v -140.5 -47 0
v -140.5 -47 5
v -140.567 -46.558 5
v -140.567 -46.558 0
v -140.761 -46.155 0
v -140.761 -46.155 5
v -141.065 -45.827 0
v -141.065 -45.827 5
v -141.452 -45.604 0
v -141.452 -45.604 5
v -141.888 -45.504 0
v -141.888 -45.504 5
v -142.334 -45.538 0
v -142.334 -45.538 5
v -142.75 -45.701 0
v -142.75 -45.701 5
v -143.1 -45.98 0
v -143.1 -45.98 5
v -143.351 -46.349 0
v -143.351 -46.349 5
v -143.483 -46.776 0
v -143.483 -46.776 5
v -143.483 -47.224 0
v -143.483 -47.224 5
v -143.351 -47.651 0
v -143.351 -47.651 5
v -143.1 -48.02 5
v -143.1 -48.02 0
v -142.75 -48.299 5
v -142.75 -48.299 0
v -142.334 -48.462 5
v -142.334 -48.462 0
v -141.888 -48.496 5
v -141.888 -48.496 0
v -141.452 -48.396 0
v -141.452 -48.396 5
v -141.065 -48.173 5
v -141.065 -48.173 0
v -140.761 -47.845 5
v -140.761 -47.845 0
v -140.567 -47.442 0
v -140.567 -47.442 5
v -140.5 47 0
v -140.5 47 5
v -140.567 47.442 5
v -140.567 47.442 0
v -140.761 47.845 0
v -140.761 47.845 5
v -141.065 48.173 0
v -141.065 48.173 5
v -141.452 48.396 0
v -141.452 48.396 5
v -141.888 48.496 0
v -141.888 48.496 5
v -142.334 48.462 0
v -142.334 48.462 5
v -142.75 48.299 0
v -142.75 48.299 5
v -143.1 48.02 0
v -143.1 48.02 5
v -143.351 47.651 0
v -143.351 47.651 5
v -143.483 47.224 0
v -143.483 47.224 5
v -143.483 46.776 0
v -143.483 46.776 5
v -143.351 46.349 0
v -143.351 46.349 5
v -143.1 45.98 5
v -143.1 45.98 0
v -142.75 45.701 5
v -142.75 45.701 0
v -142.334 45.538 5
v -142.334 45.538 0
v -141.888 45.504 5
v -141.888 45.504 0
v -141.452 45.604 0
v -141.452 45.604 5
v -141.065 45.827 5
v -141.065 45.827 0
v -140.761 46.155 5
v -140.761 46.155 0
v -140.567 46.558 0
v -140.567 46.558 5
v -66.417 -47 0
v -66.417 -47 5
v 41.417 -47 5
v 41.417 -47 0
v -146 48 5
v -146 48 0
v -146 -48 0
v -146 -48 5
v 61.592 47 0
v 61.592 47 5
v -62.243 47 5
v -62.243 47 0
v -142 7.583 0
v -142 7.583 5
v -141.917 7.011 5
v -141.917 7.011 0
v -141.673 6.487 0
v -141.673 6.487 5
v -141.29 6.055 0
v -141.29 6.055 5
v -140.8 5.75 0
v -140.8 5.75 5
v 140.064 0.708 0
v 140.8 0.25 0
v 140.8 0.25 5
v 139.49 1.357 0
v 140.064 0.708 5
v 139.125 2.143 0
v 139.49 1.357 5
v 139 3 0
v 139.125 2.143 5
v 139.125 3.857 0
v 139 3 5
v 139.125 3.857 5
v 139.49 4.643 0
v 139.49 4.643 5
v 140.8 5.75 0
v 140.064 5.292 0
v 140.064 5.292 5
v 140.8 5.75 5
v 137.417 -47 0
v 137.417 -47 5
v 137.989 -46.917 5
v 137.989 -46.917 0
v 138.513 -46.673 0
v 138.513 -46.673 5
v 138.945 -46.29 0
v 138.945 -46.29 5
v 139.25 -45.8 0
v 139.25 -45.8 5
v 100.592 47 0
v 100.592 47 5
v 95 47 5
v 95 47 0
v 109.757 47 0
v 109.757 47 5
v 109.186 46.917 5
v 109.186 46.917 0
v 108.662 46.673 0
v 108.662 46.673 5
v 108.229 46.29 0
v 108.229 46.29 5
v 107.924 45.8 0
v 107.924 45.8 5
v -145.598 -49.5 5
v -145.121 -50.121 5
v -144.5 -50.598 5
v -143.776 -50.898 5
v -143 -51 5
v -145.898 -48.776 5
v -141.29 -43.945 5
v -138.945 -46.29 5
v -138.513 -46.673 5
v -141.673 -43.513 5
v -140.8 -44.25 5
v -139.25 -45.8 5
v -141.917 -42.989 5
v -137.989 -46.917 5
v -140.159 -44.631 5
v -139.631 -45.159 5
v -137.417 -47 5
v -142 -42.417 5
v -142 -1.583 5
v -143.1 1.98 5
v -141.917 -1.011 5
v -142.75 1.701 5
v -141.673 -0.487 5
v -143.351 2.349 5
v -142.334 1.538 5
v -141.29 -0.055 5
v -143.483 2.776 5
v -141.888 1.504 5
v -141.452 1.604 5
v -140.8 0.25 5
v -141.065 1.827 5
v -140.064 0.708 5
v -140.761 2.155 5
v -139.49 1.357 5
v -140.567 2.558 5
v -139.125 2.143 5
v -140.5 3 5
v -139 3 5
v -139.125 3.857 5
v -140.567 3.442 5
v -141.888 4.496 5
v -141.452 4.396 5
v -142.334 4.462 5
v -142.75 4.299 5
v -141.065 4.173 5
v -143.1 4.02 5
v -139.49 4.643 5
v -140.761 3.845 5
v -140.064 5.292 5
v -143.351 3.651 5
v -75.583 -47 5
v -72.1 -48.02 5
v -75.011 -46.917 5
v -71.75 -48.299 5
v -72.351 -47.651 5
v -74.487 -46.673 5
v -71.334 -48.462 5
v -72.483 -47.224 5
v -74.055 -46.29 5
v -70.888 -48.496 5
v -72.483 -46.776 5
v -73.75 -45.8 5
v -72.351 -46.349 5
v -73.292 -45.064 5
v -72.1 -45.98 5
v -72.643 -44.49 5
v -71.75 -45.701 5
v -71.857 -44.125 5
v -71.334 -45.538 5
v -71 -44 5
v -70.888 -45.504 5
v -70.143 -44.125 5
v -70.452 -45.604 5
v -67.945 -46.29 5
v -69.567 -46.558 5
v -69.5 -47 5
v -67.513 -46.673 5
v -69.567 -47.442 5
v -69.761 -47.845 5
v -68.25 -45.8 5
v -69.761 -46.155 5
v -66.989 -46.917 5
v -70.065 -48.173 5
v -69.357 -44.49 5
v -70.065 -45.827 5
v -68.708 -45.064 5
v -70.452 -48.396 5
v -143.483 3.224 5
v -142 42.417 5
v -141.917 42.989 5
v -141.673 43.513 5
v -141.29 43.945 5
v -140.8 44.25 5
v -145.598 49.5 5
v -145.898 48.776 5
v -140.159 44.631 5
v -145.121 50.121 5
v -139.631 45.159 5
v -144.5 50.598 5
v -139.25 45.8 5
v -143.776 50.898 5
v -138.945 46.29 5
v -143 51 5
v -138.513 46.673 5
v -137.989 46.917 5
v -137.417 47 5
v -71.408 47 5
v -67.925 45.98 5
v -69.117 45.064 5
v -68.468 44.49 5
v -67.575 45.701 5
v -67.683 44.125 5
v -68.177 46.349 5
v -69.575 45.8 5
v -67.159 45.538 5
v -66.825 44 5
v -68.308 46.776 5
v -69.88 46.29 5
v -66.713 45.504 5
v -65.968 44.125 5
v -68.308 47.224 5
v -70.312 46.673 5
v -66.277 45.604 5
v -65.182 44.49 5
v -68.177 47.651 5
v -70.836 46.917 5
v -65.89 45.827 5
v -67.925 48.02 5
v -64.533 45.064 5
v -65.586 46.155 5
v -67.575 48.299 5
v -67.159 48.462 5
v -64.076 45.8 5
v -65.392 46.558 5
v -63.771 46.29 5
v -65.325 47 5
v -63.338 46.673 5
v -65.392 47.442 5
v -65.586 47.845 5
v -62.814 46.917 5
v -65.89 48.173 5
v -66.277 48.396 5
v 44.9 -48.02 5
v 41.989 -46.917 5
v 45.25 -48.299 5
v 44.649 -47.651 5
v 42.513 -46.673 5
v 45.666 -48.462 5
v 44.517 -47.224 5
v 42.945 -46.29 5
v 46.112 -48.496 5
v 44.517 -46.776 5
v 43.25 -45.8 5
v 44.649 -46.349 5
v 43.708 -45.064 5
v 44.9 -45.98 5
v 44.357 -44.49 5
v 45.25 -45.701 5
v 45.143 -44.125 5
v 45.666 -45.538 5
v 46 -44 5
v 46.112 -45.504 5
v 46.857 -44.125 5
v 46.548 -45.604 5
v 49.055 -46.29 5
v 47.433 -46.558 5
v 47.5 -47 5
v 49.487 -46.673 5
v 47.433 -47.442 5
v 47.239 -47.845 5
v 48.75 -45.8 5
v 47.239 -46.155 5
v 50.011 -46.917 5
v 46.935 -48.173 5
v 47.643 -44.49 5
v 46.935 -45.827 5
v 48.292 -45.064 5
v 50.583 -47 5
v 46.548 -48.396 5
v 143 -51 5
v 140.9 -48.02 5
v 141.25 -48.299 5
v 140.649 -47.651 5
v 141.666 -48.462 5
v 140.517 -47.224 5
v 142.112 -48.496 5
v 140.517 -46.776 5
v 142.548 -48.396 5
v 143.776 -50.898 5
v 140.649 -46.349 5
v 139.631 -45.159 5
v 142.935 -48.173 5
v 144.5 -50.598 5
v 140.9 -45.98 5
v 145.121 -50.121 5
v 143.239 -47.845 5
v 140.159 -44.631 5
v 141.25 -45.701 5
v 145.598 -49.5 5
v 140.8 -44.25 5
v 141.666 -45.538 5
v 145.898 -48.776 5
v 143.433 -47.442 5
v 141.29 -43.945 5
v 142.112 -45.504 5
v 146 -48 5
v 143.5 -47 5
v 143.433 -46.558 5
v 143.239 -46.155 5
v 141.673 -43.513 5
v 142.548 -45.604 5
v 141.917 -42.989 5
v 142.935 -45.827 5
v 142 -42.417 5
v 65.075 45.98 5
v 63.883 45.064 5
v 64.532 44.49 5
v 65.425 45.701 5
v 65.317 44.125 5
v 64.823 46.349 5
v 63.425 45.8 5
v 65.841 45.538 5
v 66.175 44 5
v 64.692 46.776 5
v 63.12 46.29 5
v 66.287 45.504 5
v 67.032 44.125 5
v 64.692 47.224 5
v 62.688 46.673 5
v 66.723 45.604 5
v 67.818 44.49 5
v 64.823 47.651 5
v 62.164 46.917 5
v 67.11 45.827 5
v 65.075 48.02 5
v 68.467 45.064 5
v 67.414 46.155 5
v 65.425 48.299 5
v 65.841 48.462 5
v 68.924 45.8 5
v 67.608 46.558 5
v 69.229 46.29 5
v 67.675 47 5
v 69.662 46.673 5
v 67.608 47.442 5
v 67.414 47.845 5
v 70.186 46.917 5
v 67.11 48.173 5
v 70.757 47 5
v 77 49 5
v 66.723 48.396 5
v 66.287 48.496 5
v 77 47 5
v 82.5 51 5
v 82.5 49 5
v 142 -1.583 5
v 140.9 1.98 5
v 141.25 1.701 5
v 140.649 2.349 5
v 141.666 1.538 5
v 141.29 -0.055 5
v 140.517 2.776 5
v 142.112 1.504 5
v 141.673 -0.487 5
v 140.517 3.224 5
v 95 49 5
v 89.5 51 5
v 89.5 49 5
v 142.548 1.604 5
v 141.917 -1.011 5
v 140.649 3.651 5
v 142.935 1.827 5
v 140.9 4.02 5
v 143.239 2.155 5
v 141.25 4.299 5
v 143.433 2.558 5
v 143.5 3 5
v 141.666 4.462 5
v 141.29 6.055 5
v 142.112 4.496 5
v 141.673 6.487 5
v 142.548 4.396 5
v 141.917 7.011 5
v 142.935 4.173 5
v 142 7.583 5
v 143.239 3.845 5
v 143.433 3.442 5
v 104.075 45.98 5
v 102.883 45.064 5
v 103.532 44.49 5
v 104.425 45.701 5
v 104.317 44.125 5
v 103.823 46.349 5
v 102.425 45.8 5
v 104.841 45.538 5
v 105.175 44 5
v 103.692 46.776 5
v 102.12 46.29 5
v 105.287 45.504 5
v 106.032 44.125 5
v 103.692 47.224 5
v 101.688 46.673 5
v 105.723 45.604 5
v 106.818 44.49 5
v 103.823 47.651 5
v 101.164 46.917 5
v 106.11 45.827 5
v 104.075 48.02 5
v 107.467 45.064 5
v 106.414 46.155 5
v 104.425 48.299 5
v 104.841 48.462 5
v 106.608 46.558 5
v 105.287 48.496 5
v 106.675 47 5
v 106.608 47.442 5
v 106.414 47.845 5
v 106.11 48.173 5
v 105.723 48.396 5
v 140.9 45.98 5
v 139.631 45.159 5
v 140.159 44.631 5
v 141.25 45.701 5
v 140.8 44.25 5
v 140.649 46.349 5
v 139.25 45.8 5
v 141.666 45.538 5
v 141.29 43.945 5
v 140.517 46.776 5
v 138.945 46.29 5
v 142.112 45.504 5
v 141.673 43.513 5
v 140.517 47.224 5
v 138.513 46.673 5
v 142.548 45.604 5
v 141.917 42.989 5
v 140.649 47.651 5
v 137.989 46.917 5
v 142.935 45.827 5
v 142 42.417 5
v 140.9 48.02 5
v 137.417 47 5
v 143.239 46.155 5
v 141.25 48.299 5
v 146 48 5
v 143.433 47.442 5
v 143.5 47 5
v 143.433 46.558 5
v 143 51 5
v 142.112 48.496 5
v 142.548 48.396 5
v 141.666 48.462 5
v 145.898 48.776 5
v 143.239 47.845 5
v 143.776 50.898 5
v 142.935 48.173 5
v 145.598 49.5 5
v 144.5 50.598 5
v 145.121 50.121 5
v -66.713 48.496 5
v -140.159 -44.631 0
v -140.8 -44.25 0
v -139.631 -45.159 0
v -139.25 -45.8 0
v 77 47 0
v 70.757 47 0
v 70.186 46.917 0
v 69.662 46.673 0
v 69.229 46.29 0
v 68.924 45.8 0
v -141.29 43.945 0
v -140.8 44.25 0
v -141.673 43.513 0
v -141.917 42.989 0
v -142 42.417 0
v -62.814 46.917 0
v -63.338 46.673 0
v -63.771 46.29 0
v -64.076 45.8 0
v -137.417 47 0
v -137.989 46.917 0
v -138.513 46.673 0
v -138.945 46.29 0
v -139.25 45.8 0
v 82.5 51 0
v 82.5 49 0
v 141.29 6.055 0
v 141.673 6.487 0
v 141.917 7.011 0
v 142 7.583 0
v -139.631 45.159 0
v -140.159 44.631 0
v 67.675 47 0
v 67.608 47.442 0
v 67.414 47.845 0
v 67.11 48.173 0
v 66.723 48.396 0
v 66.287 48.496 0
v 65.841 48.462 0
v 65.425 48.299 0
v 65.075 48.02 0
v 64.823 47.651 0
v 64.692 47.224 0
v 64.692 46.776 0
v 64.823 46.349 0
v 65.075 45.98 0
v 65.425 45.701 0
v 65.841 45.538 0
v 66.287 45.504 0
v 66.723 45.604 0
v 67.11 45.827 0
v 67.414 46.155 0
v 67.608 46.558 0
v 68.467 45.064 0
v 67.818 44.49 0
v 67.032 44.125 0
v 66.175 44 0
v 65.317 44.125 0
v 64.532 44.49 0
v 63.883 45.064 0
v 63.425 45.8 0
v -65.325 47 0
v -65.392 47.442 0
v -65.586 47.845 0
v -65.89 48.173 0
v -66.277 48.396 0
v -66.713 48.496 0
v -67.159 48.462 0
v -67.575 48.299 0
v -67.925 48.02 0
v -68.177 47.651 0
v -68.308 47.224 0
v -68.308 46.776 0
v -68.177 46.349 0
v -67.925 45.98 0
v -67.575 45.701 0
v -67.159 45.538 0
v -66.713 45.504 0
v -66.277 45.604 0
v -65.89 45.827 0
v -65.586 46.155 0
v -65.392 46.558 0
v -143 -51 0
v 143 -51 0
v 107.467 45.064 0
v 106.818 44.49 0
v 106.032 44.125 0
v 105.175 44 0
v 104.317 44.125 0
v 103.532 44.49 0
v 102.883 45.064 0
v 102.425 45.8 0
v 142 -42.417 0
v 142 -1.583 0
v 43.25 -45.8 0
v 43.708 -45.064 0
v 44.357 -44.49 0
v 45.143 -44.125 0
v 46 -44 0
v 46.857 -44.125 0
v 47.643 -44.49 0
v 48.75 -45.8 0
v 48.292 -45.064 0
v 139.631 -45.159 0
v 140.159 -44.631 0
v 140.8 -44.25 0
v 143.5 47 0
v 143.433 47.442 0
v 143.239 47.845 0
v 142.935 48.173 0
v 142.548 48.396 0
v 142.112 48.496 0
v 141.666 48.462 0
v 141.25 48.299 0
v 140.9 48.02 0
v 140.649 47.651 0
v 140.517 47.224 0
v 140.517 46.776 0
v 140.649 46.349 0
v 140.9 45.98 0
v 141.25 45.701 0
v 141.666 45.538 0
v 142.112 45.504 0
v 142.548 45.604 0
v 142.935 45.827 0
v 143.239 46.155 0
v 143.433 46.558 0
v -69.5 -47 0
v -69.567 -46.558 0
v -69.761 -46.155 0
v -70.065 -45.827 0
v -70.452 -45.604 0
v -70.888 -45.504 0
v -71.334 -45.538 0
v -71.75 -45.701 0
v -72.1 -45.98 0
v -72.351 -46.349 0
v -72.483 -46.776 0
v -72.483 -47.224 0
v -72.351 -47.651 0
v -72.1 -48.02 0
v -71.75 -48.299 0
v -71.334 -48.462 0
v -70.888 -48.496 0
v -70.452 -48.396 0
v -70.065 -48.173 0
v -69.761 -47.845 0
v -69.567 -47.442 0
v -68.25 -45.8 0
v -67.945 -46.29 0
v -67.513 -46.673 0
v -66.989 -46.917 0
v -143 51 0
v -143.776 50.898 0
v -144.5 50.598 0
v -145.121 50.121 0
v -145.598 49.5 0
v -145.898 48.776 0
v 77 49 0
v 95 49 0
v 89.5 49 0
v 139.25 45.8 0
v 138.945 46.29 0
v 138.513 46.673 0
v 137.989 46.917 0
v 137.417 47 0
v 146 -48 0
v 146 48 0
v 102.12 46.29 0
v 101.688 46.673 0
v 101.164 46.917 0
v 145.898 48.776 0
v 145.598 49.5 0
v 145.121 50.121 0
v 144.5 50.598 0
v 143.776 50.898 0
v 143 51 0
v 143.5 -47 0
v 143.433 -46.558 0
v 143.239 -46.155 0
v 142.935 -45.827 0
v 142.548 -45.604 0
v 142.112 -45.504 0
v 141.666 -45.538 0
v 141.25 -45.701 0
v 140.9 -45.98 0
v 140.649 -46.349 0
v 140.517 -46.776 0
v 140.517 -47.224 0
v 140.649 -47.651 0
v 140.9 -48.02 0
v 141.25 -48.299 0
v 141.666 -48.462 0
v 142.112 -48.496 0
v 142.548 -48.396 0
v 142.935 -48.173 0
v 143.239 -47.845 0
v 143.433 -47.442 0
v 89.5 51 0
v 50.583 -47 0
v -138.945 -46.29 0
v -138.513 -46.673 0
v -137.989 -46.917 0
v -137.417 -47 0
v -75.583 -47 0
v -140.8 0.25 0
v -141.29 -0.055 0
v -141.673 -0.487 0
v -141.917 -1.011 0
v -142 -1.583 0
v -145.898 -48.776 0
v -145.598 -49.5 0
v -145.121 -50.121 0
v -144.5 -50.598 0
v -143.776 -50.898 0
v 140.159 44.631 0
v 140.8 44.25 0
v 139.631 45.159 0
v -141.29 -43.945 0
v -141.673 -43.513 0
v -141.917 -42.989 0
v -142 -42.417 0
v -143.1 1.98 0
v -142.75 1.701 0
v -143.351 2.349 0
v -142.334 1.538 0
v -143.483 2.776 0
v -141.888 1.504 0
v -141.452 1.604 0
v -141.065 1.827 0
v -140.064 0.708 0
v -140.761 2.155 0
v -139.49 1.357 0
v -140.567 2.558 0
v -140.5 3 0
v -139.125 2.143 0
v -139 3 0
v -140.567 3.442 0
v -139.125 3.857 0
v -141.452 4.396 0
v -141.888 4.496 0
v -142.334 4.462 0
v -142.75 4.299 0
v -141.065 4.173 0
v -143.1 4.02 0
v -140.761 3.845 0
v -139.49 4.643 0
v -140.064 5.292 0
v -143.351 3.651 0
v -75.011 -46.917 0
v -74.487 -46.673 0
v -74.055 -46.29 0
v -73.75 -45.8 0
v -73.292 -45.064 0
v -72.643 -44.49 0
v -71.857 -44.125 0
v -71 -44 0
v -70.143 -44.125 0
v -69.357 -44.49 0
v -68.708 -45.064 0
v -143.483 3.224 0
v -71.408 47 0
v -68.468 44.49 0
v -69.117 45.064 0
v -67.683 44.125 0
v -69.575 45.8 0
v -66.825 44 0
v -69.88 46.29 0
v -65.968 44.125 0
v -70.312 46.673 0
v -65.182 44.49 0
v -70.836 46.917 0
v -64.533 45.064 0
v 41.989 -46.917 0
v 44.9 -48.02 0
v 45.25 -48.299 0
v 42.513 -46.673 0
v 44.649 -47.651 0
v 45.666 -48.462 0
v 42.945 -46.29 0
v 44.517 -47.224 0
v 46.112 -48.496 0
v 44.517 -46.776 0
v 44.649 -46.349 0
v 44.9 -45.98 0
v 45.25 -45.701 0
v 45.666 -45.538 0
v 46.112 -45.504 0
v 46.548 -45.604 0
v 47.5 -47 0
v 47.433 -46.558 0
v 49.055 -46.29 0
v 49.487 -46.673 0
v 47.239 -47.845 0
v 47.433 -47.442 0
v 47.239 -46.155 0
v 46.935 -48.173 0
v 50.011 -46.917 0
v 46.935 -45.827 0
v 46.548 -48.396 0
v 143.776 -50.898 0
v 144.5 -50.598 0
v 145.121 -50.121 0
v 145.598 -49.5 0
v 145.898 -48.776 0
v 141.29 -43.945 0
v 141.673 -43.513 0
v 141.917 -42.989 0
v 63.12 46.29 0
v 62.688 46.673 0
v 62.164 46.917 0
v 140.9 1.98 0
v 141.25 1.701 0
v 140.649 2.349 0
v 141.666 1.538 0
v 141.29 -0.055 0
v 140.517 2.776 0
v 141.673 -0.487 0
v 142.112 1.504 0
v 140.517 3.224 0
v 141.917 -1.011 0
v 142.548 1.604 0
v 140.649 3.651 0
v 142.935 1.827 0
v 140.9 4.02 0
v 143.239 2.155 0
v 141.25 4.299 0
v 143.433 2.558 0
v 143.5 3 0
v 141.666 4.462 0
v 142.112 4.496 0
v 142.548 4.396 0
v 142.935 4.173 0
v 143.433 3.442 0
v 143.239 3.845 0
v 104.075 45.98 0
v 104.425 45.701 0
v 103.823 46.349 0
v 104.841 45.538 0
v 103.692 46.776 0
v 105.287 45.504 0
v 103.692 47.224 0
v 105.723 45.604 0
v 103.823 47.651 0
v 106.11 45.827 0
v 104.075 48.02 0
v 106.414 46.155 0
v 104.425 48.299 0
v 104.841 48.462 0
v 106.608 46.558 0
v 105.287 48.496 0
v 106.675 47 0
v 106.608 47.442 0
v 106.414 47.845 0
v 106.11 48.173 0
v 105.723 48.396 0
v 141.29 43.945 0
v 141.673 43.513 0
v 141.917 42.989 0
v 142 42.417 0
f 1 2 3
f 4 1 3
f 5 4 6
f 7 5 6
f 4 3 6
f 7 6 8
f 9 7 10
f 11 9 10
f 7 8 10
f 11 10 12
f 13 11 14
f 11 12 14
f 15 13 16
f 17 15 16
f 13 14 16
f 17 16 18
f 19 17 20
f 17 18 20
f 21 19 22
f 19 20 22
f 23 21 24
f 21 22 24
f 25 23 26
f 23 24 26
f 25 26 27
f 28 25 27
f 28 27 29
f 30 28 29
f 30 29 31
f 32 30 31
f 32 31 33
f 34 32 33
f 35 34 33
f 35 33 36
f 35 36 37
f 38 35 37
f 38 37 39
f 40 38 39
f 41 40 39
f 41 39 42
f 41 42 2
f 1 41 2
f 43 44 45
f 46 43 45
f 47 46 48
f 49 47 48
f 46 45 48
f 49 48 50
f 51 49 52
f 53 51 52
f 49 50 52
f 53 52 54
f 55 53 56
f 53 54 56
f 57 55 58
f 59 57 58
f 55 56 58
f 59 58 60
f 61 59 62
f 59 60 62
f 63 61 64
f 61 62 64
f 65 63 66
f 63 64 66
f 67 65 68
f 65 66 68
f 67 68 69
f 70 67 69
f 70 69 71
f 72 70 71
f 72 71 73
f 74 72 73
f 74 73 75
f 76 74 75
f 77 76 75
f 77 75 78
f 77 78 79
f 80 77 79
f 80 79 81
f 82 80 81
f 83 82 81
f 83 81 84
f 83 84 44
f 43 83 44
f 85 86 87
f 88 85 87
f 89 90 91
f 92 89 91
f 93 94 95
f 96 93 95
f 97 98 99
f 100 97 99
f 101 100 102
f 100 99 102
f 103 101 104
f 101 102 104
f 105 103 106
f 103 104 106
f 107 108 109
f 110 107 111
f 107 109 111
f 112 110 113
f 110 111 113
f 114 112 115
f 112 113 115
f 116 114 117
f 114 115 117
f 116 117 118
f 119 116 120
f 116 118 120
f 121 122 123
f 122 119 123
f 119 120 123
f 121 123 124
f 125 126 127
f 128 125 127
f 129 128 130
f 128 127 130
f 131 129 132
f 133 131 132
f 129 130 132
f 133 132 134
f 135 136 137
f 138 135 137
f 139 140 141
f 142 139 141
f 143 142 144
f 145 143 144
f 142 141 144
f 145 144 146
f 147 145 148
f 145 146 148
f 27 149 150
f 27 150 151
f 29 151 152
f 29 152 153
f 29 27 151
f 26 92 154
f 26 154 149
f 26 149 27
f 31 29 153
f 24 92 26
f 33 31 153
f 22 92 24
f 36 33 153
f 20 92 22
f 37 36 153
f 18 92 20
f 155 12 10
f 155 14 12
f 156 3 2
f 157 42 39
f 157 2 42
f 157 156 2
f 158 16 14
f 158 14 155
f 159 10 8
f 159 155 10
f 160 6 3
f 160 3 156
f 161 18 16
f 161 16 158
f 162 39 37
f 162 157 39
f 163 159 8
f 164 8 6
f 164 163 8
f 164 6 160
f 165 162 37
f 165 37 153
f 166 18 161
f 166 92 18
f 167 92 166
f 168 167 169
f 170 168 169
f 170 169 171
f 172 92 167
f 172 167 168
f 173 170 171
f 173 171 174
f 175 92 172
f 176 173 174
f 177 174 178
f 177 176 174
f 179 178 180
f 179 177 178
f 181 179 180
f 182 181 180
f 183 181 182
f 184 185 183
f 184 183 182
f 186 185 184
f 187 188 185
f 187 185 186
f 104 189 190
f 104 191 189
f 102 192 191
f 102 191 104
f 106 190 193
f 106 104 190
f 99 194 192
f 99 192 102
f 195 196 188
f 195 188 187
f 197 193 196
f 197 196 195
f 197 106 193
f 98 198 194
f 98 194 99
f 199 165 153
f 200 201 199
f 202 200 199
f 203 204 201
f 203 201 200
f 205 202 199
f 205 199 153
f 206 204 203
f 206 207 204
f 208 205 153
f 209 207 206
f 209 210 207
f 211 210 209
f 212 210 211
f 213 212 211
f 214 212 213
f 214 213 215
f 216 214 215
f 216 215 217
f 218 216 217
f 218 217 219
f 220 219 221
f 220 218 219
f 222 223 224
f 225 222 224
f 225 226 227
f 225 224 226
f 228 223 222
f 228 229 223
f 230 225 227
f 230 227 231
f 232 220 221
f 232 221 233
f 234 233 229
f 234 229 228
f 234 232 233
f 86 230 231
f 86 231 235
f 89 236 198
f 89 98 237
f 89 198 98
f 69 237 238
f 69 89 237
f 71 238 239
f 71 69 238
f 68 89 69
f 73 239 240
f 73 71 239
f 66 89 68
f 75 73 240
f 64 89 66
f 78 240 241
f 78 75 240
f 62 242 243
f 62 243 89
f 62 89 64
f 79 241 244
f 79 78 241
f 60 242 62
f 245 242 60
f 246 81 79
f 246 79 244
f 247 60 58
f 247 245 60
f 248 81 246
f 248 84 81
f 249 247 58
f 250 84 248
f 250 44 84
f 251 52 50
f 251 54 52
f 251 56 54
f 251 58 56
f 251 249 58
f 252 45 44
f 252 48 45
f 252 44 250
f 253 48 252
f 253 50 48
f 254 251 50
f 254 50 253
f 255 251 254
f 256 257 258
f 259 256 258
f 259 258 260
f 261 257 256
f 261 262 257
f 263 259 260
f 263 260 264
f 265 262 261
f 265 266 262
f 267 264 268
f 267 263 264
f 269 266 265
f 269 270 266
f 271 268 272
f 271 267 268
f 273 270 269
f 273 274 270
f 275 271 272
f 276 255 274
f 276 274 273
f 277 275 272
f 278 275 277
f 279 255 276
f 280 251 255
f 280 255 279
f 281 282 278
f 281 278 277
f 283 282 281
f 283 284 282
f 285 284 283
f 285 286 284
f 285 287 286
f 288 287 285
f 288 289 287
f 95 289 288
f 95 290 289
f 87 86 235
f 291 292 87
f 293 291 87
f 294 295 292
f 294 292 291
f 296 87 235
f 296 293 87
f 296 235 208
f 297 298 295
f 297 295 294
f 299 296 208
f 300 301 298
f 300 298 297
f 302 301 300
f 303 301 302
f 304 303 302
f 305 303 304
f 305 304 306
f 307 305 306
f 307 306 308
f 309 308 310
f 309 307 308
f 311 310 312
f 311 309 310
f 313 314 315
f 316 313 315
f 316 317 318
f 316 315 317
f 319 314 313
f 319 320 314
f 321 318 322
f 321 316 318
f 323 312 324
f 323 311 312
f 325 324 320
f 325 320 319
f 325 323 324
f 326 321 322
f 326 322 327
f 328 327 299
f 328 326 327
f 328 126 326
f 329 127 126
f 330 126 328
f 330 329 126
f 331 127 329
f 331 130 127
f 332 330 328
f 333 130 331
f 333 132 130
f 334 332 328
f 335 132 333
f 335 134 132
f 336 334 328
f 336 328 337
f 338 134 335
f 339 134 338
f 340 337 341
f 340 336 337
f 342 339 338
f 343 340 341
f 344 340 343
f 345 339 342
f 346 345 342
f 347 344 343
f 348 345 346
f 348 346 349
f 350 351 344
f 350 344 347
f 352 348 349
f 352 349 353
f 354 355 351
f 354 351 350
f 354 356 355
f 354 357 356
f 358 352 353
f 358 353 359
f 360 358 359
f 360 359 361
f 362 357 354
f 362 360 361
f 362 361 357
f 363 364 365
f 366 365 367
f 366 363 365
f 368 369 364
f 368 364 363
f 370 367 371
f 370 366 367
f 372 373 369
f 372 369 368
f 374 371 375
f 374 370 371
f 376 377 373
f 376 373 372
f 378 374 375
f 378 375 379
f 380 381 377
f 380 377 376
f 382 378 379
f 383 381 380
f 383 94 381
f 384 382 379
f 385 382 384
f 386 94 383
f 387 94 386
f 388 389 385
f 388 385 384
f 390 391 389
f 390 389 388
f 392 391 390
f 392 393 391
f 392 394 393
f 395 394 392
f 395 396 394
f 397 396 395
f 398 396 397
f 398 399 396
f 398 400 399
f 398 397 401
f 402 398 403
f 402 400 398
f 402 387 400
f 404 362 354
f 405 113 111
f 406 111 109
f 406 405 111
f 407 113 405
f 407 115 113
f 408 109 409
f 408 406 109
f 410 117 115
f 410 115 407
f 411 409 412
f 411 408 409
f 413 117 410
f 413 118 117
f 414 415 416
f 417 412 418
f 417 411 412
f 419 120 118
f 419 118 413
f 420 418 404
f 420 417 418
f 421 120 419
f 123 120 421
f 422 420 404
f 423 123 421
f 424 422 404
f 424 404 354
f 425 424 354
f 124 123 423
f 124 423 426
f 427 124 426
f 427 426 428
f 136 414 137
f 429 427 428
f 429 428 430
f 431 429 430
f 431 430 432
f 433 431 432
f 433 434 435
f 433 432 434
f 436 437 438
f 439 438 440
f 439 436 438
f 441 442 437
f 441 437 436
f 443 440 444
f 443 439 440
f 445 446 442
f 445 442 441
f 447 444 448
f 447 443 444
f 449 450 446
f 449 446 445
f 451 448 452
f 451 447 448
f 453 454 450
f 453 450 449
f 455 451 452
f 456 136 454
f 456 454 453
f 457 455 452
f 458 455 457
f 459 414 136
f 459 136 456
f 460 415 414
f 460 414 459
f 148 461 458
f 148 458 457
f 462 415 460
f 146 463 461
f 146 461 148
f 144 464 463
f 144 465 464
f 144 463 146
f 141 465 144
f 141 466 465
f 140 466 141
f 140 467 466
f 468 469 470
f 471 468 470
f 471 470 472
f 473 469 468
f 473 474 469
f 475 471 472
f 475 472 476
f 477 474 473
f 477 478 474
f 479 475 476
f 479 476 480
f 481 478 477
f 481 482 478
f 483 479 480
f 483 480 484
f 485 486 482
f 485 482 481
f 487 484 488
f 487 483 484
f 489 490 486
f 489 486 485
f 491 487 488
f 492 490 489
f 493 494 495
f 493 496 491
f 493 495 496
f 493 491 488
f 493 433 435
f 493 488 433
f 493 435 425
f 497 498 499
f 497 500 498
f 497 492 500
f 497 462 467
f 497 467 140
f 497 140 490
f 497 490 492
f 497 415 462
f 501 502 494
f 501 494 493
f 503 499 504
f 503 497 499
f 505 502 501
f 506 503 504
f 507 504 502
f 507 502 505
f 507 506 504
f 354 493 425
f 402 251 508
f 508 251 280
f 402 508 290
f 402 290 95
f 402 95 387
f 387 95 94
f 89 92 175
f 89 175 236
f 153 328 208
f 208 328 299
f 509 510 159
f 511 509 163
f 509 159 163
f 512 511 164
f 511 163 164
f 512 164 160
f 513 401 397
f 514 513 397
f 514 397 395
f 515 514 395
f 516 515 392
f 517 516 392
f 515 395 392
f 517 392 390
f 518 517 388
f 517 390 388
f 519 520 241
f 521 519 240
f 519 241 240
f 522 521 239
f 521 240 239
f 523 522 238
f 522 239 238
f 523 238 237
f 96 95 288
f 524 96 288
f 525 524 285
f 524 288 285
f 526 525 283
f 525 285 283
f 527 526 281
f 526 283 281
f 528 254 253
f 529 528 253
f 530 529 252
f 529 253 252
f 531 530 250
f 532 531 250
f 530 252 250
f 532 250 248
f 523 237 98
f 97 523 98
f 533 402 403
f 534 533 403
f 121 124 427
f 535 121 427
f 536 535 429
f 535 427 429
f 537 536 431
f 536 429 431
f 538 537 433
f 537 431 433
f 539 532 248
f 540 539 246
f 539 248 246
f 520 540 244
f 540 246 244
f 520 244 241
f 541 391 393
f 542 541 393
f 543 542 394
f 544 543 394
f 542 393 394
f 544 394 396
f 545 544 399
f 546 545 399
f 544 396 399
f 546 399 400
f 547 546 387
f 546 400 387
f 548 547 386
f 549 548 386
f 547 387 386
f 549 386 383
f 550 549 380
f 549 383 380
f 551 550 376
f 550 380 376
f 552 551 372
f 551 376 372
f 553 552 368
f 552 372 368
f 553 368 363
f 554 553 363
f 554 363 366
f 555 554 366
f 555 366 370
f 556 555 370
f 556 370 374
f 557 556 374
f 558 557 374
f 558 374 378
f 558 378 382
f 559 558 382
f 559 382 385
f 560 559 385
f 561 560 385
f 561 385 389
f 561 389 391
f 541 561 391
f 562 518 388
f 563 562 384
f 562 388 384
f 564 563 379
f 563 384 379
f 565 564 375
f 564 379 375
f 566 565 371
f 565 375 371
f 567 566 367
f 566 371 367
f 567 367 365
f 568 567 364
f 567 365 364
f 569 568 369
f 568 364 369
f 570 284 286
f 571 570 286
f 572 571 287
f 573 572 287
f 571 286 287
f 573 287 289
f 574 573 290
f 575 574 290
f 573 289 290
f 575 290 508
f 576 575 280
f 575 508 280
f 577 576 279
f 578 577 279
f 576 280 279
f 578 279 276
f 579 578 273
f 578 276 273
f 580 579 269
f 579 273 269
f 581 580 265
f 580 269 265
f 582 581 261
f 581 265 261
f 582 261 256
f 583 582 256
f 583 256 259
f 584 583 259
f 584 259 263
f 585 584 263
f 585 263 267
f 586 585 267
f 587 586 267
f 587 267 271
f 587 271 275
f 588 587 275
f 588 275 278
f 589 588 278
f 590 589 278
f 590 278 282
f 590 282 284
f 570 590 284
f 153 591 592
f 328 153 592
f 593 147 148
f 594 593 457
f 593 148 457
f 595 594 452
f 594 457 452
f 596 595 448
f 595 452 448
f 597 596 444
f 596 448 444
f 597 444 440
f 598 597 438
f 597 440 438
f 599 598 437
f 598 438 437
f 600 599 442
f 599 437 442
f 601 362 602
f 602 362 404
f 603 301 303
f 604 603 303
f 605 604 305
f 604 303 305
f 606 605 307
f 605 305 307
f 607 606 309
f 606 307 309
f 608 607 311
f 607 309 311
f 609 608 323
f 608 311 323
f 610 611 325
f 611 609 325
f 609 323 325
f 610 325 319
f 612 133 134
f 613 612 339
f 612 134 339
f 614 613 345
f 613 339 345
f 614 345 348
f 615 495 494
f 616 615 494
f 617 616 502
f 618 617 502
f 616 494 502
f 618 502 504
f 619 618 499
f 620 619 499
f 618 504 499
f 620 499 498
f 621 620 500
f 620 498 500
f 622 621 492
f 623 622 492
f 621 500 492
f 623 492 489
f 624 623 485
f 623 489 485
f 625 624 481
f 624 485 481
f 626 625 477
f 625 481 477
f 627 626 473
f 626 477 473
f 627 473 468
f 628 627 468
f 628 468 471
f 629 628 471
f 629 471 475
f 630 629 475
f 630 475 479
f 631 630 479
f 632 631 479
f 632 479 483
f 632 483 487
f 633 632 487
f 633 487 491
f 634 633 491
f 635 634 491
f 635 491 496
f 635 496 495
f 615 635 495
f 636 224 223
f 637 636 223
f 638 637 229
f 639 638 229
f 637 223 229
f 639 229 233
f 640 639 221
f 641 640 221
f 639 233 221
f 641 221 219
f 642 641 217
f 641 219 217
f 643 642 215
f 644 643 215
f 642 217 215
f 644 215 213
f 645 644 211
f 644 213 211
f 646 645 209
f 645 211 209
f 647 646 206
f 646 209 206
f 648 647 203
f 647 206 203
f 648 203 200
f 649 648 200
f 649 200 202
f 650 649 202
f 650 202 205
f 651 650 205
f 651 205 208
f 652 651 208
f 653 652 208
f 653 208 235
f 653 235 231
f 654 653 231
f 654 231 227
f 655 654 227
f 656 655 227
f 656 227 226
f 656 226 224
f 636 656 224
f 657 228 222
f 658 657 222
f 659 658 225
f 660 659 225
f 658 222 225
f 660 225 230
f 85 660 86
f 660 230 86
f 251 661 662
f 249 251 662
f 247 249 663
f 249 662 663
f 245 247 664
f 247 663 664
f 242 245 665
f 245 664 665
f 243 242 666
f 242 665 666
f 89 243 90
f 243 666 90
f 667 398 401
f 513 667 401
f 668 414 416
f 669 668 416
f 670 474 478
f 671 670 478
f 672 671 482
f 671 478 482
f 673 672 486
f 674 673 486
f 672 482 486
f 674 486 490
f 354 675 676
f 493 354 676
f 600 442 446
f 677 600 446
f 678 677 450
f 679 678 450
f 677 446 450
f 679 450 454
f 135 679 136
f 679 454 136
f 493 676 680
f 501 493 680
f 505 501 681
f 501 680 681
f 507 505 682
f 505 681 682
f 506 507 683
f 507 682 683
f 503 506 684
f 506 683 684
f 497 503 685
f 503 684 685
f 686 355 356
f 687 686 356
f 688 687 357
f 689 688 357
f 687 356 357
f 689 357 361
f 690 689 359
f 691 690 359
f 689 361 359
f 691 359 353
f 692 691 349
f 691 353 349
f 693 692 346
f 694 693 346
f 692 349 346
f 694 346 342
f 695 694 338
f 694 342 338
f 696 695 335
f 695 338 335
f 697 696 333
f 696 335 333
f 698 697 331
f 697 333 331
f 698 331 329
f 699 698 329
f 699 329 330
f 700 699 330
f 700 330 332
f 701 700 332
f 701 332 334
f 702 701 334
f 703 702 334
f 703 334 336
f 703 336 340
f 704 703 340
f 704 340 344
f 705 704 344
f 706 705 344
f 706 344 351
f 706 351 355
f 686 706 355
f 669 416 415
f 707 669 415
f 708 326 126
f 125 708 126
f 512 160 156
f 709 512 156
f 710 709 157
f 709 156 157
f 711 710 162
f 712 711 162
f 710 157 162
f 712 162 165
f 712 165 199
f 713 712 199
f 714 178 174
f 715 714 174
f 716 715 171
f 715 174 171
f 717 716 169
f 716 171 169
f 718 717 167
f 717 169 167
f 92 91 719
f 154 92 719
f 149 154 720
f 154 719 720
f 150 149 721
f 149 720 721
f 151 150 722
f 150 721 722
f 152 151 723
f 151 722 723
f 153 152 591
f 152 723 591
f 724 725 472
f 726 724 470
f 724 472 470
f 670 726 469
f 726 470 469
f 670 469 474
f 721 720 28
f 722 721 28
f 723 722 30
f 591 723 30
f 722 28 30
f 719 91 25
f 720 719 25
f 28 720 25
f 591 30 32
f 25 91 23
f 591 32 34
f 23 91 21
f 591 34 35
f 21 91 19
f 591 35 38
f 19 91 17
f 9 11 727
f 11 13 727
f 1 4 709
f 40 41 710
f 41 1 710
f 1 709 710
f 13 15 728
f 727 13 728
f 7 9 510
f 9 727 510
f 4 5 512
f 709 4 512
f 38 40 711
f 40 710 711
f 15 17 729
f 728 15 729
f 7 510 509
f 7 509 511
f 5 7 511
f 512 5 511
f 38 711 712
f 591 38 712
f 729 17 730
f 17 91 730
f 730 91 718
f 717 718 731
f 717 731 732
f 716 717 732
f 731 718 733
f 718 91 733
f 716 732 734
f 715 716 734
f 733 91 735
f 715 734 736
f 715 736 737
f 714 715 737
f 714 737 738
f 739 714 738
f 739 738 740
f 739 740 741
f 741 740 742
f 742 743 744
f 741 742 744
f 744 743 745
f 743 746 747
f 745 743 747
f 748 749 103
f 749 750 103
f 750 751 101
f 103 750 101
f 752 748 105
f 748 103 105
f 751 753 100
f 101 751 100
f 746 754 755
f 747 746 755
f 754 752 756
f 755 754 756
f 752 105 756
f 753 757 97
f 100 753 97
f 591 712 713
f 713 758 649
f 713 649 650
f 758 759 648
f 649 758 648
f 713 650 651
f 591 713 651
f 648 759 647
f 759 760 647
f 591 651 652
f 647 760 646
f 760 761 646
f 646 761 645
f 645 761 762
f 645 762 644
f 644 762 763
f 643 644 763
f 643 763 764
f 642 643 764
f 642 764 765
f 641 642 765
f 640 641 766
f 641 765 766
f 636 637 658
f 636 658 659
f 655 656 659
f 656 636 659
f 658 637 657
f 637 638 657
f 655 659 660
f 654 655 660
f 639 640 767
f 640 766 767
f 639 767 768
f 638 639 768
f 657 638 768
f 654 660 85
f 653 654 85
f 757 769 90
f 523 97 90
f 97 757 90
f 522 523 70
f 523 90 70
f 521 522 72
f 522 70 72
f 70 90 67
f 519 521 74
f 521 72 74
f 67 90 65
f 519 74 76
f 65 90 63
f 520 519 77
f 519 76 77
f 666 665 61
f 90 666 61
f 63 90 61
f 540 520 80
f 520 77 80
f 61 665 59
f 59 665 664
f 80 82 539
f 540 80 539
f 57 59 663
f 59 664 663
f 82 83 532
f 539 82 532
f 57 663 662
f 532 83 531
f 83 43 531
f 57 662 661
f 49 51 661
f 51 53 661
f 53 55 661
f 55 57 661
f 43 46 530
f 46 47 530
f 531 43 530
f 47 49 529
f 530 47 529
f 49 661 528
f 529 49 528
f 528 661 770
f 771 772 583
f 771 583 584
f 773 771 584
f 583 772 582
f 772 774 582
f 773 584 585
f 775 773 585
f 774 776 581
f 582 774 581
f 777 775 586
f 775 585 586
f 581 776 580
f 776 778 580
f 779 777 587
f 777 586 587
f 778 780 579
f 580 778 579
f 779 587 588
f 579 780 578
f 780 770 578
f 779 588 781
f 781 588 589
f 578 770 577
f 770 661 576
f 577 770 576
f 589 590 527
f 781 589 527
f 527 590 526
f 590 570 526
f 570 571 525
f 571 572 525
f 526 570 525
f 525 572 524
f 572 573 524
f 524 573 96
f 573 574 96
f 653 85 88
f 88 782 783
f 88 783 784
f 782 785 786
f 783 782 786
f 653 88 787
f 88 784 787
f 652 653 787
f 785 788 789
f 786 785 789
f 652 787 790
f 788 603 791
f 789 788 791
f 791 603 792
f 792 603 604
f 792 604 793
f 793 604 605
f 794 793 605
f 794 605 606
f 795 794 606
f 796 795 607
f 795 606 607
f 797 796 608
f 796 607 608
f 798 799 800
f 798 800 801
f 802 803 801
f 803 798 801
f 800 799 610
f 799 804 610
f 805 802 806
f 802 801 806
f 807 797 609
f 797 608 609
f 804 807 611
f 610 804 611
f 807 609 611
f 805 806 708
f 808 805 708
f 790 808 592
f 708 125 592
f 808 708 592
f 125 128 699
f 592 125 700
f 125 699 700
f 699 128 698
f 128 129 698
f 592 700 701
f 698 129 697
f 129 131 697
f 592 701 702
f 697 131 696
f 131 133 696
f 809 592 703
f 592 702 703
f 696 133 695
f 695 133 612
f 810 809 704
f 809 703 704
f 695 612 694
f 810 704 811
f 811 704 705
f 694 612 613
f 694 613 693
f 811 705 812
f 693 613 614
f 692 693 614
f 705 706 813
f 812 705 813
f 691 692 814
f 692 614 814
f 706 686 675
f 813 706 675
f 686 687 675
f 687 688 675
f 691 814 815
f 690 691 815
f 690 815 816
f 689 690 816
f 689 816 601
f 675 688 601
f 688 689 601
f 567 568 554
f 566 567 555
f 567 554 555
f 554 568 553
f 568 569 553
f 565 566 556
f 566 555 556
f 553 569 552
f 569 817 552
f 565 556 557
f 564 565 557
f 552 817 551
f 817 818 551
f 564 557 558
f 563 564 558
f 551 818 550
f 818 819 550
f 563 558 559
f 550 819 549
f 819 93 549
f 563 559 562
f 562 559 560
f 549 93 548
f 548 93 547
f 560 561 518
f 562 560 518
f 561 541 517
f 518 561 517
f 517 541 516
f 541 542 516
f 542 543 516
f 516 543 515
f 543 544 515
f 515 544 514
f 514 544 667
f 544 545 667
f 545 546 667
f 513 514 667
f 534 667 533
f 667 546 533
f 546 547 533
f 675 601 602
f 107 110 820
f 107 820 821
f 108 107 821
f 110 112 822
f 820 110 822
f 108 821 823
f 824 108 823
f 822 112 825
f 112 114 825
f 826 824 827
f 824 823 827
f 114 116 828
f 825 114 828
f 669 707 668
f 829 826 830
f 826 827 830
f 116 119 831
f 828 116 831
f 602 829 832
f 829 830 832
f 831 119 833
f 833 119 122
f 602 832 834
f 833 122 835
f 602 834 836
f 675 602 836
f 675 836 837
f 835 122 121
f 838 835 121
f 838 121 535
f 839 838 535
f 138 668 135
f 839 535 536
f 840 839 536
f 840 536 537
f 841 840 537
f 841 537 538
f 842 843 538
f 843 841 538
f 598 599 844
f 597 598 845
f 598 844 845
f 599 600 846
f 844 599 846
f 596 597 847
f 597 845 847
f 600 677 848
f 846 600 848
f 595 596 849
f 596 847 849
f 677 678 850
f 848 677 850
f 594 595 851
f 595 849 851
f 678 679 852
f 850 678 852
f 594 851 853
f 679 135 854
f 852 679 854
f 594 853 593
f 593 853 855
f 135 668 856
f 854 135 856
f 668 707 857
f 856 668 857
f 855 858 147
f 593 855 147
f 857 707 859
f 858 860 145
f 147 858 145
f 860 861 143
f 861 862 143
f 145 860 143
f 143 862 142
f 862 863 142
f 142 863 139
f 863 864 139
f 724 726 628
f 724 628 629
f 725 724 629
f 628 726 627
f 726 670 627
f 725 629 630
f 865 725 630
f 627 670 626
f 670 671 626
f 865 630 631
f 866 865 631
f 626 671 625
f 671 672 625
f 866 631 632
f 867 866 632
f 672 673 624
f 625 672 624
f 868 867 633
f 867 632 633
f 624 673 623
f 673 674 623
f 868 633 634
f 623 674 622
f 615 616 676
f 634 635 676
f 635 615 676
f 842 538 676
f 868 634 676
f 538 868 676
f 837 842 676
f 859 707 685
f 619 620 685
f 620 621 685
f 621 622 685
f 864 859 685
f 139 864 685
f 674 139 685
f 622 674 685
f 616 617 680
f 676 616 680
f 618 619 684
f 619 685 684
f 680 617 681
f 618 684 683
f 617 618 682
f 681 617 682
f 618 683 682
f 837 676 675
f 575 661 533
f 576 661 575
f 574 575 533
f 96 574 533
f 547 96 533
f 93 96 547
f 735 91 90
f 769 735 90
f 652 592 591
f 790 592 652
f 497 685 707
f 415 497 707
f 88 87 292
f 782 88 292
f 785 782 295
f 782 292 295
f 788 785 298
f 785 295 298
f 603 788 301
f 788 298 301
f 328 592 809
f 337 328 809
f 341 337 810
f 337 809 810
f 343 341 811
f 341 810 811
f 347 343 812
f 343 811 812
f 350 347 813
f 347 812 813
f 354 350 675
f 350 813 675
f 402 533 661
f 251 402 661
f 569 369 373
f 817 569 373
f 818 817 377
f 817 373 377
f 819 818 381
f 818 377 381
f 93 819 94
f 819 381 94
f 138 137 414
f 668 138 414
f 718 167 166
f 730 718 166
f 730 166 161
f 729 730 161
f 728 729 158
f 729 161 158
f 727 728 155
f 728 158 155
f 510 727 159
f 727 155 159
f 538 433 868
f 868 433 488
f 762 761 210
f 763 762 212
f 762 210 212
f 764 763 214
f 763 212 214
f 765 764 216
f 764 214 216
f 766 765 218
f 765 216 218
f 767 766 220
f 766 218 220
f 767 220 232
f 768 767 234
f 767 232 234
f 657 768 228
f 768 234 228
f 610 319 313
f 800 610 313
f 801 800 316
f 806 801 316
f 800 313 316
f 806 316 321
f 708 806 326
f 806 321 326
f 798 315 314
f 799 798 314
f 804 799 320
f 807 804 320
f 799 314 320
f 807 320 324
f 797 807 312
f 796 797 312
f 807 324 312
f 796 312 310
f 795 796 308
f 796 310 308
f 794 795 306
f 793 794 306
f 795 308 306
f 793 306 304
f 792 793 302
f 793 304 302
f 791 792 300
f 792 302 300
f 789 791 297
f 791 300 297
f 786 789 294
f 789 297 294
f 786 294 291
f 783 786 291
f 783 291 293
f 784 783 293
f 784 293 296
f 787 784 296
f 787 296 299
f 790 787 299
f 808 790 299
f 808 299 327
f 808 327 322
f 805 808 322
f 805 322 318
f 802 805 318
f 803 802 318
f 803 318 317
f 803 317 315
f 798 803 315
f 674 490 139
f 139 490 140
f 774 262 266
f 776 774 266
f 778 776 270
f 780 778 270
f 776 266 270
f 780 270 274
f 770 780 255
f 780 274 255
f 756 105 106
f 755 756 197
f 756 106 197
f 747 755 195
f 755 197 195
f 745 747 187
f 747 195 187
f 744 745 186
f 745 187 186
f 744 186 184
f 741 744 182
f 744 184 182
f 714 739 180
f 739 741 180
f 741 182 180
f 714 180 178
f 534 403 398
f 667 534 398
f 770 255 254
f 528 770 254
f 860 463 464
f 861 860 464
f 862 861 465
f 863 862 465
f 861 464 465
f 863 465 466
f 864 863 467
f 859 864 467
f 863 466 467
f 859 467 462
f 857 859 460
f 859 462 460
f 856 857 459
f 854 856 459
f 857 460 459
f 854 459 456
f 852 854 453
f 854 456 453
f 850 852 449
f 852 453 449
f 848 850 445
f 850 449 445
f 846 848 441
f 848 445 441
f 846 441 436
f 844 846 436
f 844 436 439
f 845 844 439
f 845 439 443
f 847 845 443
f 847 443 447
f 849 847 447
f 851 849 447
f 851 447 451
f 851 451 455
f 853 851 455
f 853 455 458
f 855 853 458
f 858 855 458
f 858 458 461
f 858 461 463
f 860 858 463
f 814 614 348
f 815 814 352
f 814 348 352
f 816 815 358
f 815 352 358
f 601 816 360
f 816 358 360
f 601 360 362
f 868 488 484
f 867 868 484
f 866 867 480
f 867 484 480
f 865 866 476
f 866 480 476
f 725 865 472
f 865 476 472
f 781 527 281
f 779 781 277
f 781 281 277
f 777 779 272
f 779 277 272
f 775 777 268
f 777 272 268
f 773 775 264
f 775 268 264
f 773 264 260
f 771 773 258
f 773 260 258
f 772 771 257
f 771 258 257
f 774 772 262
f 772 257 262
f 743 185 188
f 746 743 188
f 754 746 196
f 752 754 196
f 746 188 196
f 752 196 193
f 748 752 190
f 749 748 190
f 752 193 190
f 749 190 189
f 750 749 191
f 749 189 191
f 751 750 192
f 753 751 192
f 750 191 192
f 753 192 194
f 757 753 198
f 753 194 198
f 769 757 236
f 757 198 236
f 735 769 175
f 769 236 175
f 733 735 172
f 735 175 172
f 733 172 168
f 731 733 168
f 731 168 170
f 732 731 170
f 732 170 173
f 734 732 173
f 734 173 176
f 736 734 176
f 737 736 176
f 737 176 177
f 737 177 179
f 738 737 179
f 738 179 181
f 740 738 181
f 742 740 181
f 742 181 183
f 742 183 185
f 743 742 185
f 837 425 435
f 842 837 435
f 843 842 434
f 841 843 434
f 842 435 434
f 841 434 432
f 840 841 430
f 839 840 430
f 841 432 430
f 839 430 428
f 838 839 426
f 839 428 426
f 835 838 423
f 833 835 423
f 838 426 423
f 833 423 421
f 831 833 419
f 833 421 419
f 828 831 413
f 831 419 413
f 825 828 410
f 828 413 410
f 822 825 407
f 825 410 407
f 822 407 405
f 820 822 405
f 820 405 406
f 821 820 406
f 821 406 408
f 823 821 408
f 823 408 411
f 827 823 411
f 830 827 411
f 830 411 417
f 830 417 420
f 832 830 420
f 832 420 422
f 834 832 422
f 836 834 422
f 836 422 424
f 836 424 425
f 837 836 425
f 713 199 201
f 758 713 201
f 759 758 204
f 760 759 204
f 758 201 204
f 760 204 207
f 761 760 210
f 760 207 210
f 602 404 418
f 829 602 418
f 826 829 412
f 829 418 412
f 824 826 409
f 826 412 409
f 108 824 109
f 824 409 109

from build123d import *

# Parameters (mm, degrees)
F1_DEPTH = 5
F2_R     = 1.1
F3_DEPTH = 5.001
F4_R     = 1.5
F5_DEPTH = 5.001
F7_DEPTH = 5.001


with BuildPart() as f1:
    # F0 (on Top) → F1 (new body)
    with BuildSketch(Plane.XY):
        with BuildLine():
            ThreePointArc((146, 48), (145.12132, 50.12132), (143, 51))
            Line((143, 51), (-143, 51))
            ThreePointArc((-143, 51), (-145.12132, 50.12132), (-146, 48))
            Line((-146, 48), (-146, -48))
            ThreePointArc((-146, -48), (-145.12132, -50.12132), (-143, -51))
            Line((-143, -51), (143, -51))
            ThreePointArc((143, -51), (145.12132, -50.12132), (146, -48))
            Line((146, -48), (146, 48))
        make_face()
    extrude(amount=F1_DEPTH)

    # F2 (on face) → F3 (cut, through all)
    with BuildSketch(Plane.XY.offset(5)):
        with Locations((-142, 47)):
            Circle(F2_R)
        with Locations((142, 47)):
            Circle(F2_R)
        with Locations((-66.825193, 47)):
            Circle(F2_R)
        with Locations((66.174807, 47)):
            Circle(F2_R)
        with Locations((-142, -47)):
            Circle(F2_R)
        with Locations((142, -47)):
            Circle(F2_R)
        with Locations((-71, -47)):
            Circle(F2_R)
        with Locations((46, -47)):
            Circle(F2_R)
        with Locations((142, 3)):
            Circle(F2_R)
        with Locations((-142, 3)):
            Circle(F2_R)
    extrude(amount=-F3_DEPTH, mode=Mode.SUBTRACT)

    # F4 (on face) → F5 (cut, through all)
    with BuildSketch(Plane.XY.offset(5)):
        with BuildLine():
            Line((-71.407769, 47), (-137.417424, 47))
            ThreePointArc((-137.417424, 47), (-138.512869, 46.67332), (-139.250455, 45.8))
            ThreePointArc((-139.250455, 45.8), (-139.87868, 44.87868), (-140.8, 44.250455))
            ThreePointArc((-140.8, 44.250455), (-141.67332, 43.512869), (-142, 42.417424))
            Line((-142, 42.417424), (-142, 7.582576))
            ThreePointArc((-142, 7.582576), (-141.67332, 6.487131), (-140.8, 5.749545))
            ThreePointArc((-140.8, 5.749545), (-139, 3), (-140.8, 0.250455))
            ThreePointArc((-140.8, 0.250455), (-141.67332, -0.487131), (-142, -1.582576))
            Line((-142, -1.582576), (-142, -42.417424))
            ThreePointArc((-142, -42.417424), (-141.67332, -43.512869), (-140.8, -44.250455))
            ThreePointArc((-140.8, -44.250455), (-139.87868, -44.87868), (-139.250455, -45.8))
            ThreePointArc((-139.250455, -45.8), (-138.512869, -46.67332), (-137.417424, -47))
            Line((-137.417424, -47), (-75.582576, -47))
            ThreePointArc((-75.582576, -47), (-74.487131, -46.67332), (-73.749545, -45.8))
            ThreePointArc((-73.749545, -45.8), (-71, -44), (-68.250455, -45.8))
            ThreePointArc((-68.250455, -45.8), (-67.512869, -46.67332), (-66.417424, -47))
            Line((-66.417424, -47), (41.417424, -47))
            ThreePointArc((41.417424, -47), (42.512869, -46.67332), (43.250455, -45.8))
            ThreePointArc((43.250455, -45.8), (46, -44), (48.749545, -45.8))
            ThreePointArc((48.749545, -45.8), (49.487131, -46.67332), (50.582576, -47))
            Line((50.582576, -47), (137.417424, -47))
            ThreePointArc((137.417424, -47), (138.512869, -46.67332), (139.250455, -45.8))
            ThreePointArc((139.250455, -45.8), (139.87868, -44.87868), (140.8, -44.250455))
            ThreePointArc((140.8, -44.250455), (141.67332, -43.512869), (142, -42.417424))
            Line((142, -42.417424), (142, -1.582576))
            ThreePointArc((142, -1.582576), (141.67332, -0.487131), (140.8, 0.250455))
            ThreePointArc((140.8, 0.250455), (139, 3), (140.8, 5.749545))
            ThreePointArc((140.8, 5.749545), (141.67332, 6.487131), (142, 7.582576))
            Line((142, 7.582576), (142, 42.417424))
            ThreePointArc((142, 42.417424), (141.67332, 43.512869), (140.8, 44.250455))
            ThreePointArc((140.8, 44.250455), (139.87868, 44.87868), (139.250455, 45.8))
            ThreePointArc((139.250455, 45.8), (138.512869, 46.67332), (137.417424, 47))
            Line((137.417424, 47), (109.757383, 47))
            ThreePointArc((109.757383, 47), (108.661938, 46.67332), (107.924352, 45.8))
            ThreePointArc((107.924352, 45.8), (105.174807, 44), (102.425262, 45.8))
            ThreePointArc((102.425262, 45.8), (101.687676, 46.67332), (100.592231, 47))
            Line((100.592231, 47), (70.757383, 47))
            ThreePointArc((70.757383, 47), (69.661938, 46.67332), (68.924352, 45.8))
            ThreePointArc((68.924352, 45.8), (66.174807, 44), (63.425262, 45.8))
            ThreePointArc((63.425262, 45.8), (62.687676, 46.67332), (61.592231, 47))
            Line((61.592231, 47), (-62.242617, 47))
            ThreePointArc((-62.242617, 47), (-63.338062, 46.67332), (-64.075648, 45.8))
            ThreePointArc((-64.075648, 45.8), (-66.825193, 44), (-69.574738, 45.8))
            ThreePointArc((-69.574738, 45.8), (-70.312324, 46.67332), (-71.407769, 47))
        make_face()
        with Locations((-142, 47)):
            Circle(F4_R)
        with Locations((-66.825193, 47)):
            Circle(F4_R)
        with Locations((-142, 3)):
            Circle(F4_R)
        with Locations((-142, -47)):
            Circle(F4_R)
        with Locations((66.174807, 47)):
            Circle(F4_R)
        with Locations((142, 3)):
            Circle(F4_R)
        with Locations((142, -47)):
            Circle(F4_R)
        with Locations((46, -47)):
            Circle(F4_R)
        with Locations((-71, -47)):
            Circle(F4_R)
        with Locations((142, 47)):
            Circle(F4_R)
        with Locations((105.174807, 47)):
            Circle(F4_R)
    extrude(amount=-F5_DEPTH, mode=Mode.SUBTRACT)

    # F6 (on face) → F7 (cut, through all)
    with BuildSketch(Plane.XY.offset(5)):
        Polygon((89.5, 51), (82.5, 51), (82.5, 49), (77, 49), (77, 47), (95, 47), (95, 49), (89.5, 49), align=None)
    extrude(amount=-F7_DEPTH, mode=Mode.SUBTRACT)


solid = f1.part
